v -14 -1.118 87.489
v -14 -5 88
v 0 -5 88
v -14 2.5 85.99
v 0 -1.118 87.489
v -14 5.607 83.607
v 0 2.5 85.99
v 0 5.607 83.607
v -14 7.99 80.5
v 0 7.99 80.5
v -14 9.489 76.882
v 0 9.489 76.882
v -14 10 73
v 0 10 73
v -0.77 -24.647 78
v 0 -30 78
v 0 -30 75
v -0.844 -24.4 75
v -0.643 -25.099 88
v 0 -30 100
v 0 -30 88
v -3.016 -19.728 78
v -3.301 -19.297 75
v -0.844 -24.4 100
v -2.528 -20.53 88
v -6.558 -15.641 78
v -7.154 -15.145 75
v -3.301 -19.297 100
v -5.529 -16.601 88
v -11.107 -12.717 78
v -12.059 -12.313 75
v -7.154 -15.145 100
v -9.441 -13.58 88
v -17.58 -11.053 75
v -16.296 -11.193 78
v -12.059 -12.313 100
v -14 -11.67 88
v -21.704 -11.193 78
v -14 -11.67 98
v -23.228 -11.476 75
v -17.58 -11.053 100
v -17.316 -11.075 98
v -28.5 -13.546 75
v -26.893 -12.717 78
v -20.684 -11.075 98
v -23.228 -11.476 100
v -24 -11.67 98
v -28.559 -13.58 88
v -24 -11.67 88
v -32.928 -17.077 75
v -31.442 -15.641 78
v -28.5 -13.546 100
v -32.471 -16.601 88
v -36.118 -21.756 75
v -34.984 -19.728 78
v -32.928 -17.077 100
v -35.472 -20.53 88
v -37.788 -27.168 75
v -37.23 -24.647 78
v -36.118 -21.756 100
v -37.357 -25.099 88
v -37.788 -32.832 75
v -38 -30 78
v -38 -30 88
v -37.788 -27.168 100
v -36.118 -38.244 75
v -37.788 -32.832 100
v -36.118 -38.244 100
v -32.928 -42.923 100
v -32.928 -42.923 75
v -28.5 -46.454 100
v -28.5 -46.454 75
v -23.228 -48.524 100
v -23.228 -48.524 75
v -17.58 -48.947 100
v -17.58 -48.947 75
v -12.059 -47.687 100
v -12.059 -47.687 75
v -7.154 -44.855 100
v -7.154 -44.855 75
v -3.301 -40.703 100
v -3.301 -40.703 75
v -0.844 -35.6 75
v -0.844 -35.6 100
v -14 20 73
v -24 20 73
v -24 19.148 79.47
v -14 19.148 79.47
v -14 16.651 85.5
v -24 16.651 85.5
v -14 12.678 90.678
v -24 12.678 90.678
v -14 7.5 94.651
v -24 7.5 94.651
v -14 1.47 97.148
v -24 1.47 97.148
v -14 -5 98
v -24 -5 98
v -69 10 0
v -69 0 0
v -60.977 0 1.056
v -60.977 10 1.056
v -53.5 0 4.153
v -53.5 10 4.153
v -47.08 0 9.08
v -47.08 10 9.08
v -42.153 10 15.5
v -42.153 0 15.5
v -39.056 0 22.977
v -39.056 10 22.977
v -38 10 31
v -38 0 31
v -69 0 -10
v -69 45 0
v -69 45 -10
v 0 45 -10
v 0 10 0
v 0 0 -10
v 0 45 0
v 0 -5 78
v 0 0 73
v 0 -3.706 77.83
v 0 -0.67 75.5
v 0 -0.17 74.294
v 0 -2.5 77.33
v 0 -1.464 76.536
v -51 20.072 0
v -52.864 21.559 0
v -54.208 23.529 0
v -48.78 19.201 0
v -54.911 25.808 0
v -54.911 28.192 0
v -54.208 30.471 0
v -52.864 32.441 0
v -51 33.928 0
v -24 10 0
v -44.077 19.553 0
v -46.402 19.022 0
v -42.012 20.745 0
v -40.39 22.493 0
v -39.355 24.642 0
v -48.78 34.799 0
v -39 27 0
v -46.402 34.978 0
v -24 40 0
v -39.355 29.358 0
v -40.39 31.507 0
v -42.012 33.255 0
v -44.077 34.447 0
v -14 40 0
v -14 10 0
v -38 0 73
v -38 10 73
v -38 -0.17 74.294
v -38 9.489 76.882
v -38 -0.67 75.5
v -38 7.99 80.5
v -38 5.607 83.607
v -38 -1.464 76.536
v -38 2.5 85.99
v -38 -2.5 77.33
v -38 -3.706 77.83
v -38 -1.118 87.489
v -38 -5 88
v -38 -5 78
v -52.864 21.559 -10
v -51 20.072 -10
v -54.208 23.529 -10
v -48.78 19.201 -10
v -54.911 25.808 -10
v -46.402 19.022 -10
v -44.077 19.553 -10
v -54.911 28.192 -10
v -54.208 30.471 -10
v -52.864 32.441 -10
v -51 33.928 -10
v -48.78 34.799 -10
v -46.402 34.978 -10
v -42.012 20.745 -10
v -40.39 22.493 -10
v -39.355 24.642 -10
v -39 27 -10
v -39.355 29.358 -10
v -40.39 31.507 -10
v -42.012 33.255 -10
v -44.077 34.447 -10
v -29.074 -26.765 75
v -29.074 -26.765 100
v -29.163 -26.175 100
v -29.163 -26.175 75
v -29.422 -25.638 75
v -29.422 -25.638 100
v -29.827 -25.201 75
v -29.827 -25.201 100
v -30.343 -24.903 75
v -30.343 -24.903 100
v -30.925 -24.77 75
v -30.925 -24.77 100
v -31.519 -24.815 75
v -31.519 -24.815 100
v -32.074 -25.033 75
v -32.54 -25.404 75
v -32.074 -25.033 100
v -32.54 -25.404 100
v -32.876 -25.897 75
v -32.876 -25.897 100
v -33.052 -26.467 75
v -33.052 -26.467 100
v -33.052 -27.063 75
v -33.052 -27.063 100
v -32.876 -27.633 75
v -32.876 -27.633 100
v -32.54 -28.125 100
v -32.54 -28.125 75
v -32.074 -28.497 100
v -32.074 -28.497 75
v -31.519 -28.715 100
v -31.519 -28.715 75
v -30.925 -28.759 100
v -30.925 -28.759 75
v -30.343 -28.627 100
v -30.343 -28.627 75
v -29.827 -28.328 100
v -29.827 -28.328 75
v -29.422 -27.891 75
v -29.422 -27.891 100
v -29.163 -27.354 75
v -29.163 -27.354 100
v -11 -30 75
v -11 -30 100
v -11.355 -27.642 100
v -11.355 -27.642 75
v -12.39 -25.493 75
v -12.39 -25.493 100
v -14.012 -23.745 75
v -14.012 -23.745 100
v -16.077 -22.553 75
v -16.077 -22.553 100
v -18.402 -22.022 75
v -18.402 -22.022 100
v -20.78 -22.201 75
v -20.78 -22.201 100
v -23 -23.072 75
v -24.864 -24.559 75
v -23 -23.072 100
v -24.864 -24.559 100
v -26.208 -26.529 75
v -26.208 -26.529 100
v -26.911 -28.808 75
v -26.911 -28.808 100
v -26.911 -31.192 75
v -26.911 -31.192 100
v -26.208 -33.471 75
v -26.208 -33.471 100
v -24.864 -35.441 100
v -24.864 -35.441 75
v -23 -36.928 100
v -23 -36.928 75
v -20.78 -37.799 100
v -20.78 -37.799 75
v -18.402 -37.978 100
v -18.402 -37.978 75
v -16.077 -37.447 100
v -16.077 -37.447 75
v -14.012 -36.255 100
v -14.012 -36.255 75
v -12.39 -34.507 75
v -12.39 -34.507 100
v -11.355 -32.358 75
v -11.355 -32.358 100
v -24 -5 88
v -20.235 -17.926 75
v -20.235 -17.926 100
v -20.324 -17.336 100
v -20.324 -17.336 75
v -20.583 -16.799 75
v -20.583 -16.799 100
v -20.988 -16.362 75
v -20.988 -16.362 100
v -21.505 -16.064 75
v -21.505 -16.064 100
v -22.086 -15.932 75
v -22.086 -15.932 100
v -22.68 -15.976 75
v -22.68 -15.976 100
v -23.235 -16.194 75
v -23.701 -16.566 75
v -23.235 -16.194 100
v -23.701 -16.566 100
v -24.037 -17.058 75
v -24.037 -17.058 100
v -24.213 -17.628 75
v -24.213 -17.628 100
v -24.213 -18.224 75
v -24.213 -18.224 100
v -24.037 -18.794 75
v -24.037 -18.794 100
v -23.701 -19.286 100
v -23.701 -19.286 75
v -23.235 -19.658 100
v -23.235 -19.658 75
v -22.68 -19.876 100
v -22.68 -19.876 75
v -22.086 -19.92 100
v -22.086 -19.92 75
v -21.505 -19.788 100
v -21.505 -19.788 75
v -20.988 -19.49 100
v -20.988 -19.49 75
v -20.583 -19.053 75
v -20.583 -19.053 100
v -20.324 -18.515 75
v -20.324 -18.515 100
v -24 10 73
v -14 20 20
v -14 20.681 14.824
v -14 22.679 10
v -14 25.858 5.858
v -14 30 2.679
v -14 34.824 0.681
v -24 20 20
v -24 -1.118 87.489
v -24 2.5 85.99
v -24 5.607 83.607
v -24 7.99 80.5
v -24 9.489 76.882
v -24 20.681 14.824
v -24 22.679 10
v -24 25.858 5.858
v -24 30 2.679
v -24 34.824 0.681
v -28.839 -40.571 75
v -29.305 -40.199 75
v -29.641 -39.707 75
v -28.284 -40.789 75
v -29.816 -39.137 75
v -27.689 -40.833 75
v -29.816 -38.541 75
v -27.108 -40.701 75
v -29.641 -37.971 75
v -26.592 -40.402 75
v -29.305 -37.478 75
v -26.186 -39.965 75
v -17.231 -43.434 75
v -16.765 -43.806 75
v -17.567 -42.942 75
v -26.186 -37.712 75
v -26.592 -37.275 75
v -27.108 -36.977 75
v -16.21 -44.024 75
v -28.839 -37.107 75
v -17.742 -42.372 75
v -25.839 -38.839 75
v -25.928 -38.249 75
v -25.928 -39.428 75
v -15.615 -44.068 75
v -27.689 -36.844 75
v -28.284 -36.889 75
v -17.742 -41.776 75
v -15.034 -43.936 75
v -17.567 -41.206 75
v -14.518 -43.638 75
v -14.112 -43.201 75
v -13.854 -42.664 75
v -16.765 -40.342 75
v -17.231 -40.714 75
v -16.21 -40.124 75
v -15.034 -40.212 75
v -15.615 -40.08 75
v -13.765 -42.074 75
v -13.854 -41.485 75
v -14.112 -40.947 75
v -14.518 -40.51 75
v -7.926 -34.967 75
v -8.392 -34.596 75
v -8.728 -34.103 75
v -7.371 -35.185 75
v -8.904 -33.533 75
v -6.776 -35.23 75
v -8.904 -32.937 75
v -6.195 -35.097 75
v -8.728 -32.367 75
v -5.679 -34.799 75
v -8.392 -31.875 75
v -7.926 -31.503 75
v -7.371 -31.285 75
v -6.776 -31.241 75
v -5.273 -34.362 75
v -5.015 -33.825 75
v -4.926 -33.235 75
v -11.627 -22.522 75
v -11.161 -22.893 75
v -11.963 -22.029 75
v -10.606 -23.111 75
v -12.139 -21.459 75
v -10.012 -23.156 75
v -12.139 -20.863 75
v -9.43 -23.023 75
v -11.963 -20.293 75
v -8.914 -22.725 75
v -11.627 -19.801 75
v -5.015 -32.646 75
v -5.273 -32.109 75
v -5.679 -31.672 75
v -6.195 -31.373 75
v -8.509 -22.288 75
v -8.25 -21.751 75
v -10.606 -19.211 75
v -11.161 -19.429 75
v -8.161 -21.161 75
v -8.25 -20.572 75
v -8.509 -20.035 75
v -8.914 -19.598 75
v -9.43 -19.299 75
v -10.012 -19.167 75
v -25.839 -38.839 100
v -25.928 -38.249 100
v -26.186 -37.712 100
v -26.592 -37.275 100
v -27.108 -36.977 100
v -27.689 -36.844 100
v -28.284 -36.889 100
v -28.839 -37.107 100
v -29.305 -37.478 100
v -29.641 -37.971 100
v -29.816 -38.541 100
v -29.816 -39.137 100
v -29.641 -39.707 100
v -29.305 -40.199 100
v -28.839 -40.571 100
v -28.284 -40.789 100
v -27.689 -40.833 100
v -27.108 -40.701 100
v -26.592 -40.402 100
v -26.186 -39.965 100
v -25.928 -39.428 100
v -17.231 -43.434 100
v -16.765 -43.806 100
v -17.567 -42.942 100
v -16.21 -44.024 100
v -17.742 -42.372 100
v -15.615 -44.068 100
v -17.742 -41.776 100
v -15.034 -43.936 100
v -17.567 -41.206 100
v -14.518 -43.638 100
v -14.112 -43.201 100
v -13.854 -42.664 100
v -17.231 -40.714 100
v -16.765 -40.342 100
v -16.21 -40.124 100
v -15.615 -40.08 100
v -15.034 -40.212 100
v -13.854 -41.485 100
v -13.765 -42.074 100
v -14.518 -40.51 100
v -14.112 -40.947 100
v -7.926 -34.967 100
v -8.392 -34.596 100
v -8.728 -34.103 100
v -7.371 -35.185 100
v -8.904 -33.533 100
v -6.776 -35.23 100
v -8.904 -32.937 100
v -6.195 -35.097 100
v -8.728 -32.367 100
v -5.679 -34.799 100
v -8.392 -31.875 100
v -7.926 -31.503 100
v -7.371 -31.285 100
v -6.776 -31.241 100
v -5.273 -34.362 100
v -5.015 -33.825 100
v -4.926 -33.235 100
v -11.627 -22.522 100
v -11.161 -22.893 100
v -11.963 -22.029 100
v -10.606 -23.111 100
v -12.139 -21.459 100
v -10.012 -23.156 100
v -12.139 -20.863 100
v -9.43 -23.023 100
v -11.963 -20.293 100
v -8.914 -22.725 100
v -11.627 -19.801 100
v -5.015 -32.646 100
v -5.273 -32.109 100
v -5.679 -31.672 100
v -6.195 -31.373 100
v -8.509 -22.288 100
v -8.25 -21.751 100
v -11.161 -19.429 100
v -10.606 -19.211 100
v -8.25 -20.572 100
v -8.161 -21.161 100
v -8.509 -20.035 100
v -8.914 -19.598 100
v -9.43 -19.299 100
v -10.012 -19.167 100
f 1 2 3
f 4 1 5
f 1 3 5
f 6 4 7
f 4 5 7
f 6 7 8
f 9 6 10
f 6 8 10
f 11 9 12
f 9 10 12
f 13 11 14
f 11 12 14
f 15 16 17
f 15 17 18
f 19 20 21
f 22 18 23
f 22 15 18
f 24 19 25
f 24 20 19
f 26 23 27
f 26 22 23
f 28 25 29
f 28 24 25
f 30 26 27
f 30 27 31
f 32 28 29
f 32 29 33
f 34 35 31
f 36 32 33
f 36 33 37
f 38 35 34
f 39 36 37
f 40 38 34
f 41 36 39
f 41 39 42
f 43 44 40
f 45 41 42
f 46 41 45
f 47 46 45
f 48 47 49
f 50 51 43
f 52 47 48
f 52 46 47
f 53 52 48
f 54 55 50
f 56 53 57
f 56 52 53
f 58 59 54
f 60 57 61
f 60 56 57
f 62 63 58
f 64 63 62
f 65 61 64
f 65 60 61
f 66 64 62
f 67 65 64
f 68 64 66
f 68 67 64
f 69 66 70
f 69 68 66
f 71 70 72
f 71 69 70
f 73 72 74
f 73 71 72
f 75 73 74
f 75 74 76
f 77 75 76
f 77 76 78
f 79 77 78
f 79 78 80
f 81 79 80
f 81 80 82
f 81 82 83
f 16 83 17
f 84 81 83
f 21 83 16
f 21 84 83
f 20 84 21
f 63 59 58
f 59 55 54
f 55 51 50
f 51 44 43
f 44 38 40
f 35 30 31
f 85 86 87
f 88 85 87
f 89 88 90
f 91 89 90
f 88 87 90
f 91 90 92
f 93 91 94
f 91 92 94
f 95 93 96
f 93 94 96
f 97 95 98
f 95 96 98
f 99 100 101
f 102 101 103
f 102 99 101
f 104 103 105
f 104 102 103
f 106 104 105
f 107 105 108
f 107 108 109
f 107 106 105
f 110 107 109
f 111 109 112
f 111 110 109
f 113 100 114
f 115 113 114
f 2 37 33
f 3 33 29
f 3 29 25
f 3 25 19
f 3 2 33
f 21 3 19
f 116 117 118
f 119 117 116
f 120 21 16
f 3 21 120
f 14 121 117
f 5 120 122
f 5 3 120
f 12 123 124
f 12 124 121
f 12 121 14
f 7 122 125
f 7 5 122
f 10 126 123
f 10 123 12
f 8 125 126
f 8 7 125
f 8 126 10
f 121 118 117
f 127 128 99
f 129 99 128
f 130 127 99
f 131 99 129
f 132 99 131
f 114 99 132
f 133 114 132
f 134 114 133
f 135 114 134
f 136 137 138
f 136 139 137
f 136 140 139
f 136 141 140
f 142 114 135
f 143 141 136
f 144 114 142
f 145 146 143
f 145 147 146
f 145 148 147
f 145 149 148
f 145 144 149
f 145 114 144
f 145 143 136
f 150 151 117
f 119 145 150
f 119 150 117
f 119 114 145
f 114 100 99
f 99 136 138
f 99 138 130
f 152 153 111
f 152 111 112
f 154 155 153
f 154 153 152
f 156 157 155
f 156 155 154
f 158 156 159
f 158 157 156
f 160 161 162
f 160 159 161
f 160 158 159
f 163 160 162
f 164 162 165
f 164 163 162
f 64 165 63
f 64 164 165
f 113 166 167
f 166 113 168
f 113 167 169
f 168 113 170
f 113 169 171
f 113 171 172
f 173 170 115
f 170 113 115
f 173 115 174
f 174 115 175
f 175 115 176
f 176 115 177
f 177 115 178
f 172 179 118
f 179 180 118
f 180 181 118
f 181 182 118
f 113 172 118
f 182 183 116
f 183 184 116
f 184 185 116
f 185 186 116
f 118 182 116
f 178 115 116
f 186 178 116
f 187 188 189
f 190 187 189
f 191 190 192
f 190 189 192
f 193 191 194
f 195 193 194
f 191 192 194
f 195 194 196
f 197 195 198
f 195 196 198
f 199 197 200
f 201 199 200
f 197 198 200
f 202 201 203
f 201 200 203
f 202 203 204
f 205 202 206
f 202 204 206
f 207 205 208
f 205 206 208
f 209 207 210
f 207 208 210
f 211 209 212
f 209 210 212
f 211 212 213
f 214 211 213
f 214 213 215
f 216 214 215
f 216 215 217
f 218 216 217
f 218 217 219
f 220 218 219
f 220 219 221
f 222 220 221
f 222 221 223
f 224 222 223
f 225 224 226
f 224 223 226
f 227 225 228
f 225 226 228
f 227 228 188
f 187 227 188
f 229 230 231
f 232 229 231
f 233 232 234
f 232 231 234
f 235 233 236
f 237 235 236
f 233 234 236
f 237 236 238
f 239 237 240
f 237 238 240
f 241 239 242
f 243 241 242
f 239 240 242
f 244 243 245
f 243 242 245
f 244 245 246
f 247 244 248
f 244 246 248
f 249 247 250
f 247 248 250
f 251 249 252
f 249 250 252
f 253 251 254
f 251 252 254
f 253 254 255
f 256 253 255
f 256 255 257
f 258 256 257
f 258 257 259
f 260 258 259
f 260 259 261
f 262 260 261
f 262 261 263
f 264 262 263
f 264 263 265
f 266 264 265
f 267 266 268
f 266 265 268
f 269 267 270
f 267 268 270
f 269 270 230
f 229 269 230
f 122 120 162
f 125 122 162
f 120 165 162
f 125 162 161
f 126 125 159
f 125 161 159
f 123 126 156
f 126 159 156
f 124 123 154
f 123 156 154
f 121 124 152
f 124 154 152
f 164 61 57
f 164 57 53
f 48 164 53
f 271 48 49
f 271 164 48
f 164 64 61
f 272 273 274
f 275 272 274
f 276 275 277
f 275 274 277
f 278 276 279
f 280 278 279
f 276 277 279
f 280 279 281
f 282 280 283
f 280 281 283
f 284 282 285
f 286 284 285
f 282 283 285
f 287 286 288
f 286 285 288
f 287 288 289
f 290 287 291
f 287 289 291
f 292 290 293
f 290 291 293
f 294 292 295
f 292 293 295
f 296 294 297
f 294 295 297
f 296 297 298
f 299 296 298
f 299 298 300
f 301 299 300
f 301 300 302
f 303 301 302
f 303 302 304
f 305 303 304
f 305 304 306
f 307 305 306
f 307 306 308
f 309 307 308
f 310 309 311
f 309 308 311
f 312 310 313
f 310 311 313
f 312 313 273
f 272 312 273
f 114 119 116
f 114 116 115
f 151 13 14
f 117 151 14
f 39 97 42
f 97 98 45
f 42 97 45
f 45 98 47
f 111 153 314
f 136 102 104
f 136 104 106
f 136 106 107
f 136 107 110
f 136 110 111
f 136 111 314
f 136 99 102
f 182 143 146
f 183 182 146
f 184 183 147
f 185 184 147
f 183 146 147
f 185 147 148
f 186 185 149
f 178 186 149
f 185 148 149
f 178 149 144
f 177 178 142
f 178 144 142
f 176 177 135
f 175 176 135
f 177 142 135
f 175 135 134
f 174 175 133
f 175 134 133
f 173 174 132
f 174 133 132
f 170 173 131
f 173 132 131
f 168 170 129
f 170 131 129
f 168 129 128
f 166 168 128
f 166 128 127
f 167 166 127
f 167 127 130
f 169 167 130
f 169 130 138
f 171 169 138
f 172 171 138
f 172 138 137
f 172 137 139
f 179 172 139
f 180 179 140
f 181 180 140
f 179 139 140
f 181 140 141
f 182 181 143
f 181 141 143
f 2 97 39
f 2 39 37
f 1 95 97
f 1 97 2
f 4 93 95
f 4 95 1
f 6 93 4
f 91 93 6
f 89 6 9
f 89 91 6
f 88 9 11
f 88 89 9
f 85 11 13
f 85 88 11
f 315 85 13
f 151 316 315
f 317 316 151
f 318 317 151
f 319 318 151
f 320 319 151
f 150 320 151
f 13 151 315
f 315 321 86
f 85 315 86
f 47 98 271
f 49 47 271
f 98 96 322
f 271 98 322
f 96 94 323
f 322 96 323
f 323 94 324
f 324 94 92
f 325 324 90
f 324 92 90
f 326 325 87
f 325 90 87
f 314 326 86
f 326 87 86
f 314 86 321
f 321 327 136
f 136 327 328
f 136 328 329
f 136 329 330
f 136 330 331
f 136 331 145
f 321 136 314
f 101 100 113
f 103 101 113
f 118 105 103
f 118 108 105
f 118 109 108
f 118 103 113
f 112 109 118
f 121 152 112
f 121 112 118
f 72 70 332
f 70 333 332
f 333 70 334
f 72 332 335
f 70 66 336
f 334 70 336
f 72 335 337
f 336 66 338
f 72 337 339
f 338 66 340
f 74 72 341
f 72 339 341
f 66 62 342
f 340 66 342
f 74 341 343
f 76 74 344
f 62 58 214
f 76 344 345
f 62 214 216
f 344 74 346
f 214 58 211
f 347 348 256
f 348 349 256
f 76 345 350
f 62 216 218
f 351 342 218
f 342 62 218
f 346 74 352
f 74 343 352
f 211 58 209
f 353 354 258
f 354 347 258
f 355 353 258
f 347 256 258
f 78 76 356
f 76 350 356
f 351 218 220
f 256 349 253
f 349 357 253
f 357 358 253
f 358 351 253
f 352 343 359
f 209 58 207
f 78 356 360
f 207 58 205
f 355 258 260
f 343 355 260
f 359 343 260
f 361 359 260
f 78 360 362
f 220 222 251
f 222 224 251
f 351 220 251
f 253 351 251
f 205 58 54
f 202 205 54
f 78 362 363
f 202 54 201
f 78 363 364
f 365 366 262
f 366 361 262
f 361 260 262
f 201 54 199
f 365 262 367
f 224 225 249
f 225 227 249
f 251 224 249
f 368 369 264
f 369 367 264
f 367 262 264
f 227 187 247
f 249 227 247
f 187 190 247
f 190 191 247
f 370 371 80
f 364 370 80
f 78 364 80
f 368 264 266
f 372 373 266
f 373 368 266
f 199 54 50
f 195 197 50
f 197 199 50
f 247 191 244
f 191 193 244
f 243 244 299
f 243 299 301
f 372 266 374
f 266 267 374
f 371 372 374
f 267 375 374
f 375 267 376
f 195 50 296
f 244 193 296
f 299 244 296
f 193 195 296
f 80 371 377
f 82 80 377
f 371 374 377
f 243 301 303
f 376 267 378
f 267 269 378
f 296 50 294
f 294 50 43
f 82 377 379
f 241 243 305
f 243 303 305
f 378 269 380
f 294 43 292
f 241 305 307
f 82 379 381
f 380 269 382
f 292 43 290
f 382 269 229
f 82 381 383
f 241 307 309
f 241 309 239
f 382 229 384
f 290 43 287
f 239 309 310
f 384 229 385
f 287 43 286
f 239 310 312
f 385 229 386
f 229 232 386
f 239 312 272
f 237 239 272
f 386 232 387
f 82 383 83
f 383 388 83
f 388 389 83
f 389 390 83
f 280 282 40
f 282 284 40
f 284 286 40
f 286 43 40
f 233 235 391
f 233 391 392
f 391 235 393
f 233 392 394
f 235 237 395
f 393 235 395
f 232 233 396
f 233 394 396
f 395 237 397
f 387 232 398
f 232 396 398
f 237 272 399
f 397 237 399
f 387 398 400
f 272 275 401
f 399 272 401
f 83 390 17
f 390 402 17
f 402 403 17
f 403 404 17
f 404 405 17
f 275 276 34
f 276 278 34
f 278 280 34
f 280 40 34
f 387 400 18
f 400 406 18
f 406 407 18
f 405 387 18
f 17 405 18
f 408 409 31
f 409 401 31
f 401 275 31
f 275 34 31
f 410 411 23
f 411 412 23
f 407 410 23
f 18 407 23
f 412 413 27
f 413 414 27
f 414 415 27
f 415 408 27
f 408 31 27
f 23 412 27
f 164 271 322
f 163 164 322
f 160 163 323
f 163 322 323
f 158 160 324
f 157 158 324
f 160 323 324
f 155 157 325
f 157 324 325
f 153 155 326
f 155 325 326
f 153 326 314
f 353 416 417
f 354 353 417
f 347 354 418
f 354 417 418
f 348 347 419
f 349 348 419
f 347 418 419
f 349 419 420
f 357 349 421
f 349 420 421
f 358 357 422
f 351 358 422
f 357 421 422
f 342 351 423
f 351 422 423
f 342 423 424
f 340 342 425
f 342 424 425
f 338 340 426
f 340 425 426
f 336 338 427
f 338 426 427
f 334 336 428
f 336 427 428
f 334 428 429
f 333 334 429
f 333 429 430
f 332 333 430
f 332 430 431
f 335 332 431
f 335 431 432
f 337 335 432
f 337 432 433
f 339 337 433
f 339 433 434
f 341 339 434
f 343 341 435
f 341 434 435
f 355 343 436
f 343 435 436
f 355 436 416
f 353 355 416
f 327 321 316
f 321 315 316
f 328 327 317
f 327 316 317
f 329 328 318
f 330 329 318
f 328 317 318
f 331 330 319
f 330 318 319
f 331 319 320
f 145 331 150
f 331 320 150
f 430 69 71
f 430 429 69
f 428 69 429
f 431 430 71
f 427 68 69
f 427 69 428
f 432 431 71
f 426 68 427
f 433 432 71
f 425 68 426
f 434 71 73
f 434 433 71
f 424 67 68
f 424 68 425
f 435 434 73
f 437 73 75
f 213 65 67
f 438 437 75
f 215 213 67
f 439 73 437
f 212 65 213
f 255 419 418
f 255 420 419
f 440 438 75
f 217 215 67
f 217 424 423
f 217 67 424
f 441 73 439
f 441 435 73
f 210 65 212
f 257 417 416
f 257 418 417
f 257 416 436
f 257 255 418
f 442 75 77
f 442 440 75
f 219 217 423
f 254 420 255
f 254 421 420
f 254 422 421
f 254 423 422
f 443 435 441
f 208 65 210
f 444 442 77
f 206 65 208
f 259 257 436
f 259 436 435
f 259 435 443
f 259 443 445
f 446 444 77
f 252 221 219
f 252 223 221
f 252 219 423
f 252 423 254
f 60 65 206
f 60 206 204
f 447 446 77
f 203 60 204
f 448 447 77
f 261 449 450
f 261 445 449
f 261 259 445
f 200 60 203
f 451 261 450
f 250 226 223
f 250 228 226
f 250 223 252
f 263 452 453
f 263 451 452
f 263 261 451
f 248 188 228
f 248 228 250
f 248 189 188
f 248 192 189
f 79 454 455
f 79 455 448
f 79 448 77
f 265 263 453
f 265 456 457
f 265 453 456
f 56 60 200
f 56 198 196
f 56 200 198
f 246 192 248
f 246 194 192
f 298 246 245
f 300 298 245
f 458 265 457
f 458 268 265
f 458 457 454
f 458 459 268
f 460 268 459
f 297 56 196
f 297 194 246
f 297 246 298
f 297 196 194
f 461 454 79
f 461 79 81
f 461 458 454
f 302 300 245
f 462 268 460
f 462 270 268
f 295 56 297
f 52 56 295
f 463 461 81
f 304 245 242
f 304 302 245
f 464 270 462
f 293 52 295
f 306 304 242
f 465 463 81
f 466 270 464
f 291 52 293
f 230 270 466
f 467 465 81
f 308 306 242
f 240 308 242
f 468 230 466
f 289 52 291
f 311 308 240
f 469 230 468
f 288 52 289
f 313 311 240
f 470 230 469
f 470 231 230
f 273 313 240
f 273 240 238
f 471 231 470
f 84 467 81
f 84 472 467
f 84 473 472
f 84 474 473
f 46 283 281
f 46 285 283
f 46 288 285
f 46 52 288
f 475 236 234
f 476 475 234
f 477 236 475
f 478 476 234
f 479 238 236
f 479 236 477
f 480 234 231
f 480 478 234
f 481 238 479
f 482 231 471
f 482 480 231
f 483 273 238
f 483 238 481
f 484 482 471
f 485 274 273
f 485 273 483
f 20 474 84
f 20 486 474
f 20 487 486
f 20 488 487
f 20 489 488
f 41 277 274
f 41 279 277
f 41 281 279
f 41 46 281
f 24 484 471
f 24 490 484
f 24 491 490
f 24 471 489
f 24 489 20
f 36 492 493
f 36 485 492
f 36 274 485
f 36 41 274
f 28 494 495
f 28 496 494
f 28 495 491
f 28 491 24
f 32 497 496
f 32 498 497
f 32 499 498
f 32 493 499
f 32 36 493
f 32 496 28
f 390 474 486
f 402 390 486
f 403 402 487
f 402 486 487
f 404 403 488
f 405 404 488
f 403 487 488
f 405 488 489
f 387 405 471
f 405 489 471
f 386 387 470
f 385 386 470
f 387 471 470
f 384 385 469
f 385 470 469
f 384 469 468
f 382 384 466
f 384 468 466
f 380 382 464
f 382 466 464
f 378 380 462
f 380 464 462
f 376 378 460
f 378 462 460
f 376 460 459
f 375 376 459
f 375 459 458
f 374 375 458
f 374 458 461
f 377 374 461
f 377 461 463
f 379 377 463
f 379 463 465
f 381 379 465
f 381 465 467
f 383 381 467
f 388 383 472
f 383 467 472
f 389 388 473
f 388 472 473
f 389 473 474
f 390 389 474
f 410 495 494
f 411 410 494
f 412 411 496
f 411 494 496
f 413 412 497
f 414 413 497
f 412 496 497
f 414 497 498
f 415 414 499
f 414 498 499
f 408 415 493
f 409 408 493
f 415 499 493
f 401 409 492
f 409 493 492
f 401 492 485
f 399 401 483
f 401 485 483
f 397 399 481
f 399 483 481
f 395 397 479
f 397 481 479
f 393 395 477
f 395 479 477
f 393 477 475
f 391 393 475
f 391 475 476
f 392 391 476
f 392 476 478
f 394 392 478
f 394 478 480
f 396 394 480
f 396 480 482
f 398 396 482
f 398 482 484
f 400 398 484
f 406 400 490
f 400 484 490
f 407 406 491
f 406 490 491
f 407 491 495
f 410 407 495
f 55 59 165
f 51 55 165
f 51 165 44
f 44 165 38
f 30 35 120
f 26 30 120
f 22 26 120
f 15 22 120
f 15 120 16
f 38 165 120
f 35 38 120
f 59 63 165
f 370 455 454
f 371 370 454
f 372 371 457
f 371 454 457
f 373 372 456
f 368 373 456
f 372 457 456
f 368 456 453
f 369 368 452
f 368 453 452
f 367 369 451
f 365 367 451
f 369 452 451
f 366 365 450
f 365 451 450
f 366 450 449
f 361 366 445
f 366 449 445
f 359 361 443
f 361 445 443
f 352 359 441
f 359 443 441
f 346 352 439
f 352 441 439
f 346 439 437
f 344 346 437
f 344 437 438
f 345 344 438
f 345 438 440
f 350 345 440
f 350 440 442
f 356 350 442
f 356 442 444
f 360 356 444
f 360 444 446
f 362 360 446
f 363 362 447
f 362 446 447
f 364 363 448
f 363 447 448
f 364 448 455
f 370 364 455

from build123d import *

# Parameters (mm, degrees)
SKETCH1_R                = 8
BOSS_EXTRUDE1_DEPTH      = 10
BOSS_EXTRUDE3_DEPTH      = 88
BOSS_EXTRUDE3_DEPTH_BACK = 10
SKETCH1_4_W              = 38
SKETCH1_4_H              = 10
BOSS_EXTRUDE4_START      = 88
BOSS_EXTRUDE4_DEPTH      = 10
BOSS_EXTRUDE5_START      = 100
SKETCH1_6_R              = 19
SKETCH1_6_R_2            = 2
SKETCH1_6_R_3            = 8
BOSS_EXTRUDE5_DEPTH      = 25
SKETCH1_7_W              = 31
SKETCH1_7_H              = 10
BOSS_EXTRUDE6_DEPTH      = 10
FILLET1_R                = 31
FILLET3_R                = 5
FILLET4_R                = 15
BOSS_EXTRUDE7_START      = -24
BOSS_EXTRUDE7_DEPTH      = 10
FILLET5_R                = 20


with BuildPart() as part:
    # Sketch1 → Boss-Extrude1 (new body)
    with BuildSketch(Plane.XY):
        Polygon((-38, 10), (0, 10), (0, 45), (-69, 45), (-69, 10), align=None)
        with Locations((-47, 27)):
            Circle(SKETCH1_R, mode=Mode.SUBTRACT)
    extrude(amount=-BOSS_EXTRUDE1_DEPTH)

    # Sketch1<4> → Boss-Extrude3 (add, two sides: drawn at the far end of the back side and taken through both)
    with BuildSketch(Plane.XY.offset(-BOSS_EXTRUDE3_DEPTH_BACK)):
        with Locations((-19, 5)):
            Rectangle(SKETCH1_4_W, SKETCH1_4_H)
    extrude(amount=BOSS_EXTRUDE3_DEPTH + BOSS_EXTRUDE3_DEPTH_BACK)

    # Sketch1<5> → Boss-Extrude4 (add)
    with BuildSketch(Plane.XY.offset(BOSS_EXTRUDE4_START)):
        with BuildLine():
            Line((0, -30), (0, 0))
            Line((0, 0), (-38, 0))
            Line((-38, 0), (-38, -30))
            ThreePointArc((-38, -30), (-19, -11), (0, -30))
        make_face()
    extrude(amount=-BOSS_EXTRUDE4_DEPTH)

    # Sketch1<6> → Boss-Extrude5 (add)
    with BuildSketch(Plane.XY.offset(BOSS_EXTRUDE5_START)):
        with Locations((-19, -30)):
            Circle(SKETCH1_6_R)
        with Locations((-22.235238064, -17.925927171)):
            Circle(SKETCH1_6_R_2, mode=Mode.SUBTRACT)
        with Locations((-31.074072829, -26.764761936)):
            Circle(SKETCH1_6_R_2, mode=Mode.SUBTRACT)
        with Locations((-27.838834765, -38.838834765)):
            Circle(SKETCH1_6_R_2, mode=Mode.SUBTRACT)
        with Locations((-15.764761936, -42.074072829)):
            Circle(SKETCH1_6_R_2, mode=Mode.SUBTRACT)
        with Locations((-6.925927171, -33.235238064)):
            Circle(SKETCH1_6_R_2, mode=Mode.SUBTRACT)
        with Locations((-10.161165235, -21.161165235)):
            Circle(SKETCH1_6_R_2, mode=Mode.SUBTRACT)
        with Locations((-19, -30)):
            Circle(SKETCH1_6_R_3, mode=Mode.SUBTRACT)
    extrude(amount=-BOSS_EXTRUDE5_DEPTH)

    # Sketch1<7> → Boss-Extrude6 (add)
    with BuildSketch(Plane.XY):
        with Locations((-53.5, 5)):
            Rectangle(SKETCH1_7_W, SKETCH1_7_H)
    extrude(amount=-BOSS_EXTRUDE6_DEPTH)

    # Fillet1
    fillet1_edges = [part.edges().sort_by_distance(p)[0] for p in [
        (-38, 5, 0),
    ]]
    fillet(fillet1_edges, radius=FILLET1_R - 0.0001)  # a hair under: the kernel refuses the full size

    # Fillet3
    fillet3_edges = [part.edges().sort_by_distance(p)[0] for p in [
        (-19, 0, 78),
    ]]
    fillet(fillet3_edges, radius=FILLET3_R)

    # Fillet4
    fillet4_edges = [part.edges().sort_by_distance(p)[0] for p in [
        (-19, 10, 88),
    ]]
    fillet(fillet4_edges, radius=FILLET4_R)

    # Sketch2 → Boss-Extrude7 (add)
    with BuildSketch(Plane(origin=(0, 0, 0), x_dir=(0, 0, -1), z_dir=(1, 0, 0)).offset(BOSS_EXTRUDE7_START)):
        with BuildLine():
            Line((-98, -13), (-88, -13))
            Line((-88, -13), (-88, -5))
            ThreePointArc((-88, -5), (-83.606601718, 5.606601718), (-73, 10))
            Line((-73, 10), (0, 10))
            Line((0, 10), (0, 20))
            Line((0, 20), (-73, 20))
            ThreePointArc((-73, 20), (-90.67766953, 12.67766953), (-98, -5))
            Line((-98, -5), (-98, -13))
        make_face()
    extrude(amount=BOSS_EXTRUDE7_DEPTH)

    # Fillet5
    fillet5_edges = [part.edges().sort_by_distance(p)[0] for p in [
        (-19, 20, 0),
    ]]
    fillet(fillet5_edges, radius=FILLET5_R)


solid = part.part
